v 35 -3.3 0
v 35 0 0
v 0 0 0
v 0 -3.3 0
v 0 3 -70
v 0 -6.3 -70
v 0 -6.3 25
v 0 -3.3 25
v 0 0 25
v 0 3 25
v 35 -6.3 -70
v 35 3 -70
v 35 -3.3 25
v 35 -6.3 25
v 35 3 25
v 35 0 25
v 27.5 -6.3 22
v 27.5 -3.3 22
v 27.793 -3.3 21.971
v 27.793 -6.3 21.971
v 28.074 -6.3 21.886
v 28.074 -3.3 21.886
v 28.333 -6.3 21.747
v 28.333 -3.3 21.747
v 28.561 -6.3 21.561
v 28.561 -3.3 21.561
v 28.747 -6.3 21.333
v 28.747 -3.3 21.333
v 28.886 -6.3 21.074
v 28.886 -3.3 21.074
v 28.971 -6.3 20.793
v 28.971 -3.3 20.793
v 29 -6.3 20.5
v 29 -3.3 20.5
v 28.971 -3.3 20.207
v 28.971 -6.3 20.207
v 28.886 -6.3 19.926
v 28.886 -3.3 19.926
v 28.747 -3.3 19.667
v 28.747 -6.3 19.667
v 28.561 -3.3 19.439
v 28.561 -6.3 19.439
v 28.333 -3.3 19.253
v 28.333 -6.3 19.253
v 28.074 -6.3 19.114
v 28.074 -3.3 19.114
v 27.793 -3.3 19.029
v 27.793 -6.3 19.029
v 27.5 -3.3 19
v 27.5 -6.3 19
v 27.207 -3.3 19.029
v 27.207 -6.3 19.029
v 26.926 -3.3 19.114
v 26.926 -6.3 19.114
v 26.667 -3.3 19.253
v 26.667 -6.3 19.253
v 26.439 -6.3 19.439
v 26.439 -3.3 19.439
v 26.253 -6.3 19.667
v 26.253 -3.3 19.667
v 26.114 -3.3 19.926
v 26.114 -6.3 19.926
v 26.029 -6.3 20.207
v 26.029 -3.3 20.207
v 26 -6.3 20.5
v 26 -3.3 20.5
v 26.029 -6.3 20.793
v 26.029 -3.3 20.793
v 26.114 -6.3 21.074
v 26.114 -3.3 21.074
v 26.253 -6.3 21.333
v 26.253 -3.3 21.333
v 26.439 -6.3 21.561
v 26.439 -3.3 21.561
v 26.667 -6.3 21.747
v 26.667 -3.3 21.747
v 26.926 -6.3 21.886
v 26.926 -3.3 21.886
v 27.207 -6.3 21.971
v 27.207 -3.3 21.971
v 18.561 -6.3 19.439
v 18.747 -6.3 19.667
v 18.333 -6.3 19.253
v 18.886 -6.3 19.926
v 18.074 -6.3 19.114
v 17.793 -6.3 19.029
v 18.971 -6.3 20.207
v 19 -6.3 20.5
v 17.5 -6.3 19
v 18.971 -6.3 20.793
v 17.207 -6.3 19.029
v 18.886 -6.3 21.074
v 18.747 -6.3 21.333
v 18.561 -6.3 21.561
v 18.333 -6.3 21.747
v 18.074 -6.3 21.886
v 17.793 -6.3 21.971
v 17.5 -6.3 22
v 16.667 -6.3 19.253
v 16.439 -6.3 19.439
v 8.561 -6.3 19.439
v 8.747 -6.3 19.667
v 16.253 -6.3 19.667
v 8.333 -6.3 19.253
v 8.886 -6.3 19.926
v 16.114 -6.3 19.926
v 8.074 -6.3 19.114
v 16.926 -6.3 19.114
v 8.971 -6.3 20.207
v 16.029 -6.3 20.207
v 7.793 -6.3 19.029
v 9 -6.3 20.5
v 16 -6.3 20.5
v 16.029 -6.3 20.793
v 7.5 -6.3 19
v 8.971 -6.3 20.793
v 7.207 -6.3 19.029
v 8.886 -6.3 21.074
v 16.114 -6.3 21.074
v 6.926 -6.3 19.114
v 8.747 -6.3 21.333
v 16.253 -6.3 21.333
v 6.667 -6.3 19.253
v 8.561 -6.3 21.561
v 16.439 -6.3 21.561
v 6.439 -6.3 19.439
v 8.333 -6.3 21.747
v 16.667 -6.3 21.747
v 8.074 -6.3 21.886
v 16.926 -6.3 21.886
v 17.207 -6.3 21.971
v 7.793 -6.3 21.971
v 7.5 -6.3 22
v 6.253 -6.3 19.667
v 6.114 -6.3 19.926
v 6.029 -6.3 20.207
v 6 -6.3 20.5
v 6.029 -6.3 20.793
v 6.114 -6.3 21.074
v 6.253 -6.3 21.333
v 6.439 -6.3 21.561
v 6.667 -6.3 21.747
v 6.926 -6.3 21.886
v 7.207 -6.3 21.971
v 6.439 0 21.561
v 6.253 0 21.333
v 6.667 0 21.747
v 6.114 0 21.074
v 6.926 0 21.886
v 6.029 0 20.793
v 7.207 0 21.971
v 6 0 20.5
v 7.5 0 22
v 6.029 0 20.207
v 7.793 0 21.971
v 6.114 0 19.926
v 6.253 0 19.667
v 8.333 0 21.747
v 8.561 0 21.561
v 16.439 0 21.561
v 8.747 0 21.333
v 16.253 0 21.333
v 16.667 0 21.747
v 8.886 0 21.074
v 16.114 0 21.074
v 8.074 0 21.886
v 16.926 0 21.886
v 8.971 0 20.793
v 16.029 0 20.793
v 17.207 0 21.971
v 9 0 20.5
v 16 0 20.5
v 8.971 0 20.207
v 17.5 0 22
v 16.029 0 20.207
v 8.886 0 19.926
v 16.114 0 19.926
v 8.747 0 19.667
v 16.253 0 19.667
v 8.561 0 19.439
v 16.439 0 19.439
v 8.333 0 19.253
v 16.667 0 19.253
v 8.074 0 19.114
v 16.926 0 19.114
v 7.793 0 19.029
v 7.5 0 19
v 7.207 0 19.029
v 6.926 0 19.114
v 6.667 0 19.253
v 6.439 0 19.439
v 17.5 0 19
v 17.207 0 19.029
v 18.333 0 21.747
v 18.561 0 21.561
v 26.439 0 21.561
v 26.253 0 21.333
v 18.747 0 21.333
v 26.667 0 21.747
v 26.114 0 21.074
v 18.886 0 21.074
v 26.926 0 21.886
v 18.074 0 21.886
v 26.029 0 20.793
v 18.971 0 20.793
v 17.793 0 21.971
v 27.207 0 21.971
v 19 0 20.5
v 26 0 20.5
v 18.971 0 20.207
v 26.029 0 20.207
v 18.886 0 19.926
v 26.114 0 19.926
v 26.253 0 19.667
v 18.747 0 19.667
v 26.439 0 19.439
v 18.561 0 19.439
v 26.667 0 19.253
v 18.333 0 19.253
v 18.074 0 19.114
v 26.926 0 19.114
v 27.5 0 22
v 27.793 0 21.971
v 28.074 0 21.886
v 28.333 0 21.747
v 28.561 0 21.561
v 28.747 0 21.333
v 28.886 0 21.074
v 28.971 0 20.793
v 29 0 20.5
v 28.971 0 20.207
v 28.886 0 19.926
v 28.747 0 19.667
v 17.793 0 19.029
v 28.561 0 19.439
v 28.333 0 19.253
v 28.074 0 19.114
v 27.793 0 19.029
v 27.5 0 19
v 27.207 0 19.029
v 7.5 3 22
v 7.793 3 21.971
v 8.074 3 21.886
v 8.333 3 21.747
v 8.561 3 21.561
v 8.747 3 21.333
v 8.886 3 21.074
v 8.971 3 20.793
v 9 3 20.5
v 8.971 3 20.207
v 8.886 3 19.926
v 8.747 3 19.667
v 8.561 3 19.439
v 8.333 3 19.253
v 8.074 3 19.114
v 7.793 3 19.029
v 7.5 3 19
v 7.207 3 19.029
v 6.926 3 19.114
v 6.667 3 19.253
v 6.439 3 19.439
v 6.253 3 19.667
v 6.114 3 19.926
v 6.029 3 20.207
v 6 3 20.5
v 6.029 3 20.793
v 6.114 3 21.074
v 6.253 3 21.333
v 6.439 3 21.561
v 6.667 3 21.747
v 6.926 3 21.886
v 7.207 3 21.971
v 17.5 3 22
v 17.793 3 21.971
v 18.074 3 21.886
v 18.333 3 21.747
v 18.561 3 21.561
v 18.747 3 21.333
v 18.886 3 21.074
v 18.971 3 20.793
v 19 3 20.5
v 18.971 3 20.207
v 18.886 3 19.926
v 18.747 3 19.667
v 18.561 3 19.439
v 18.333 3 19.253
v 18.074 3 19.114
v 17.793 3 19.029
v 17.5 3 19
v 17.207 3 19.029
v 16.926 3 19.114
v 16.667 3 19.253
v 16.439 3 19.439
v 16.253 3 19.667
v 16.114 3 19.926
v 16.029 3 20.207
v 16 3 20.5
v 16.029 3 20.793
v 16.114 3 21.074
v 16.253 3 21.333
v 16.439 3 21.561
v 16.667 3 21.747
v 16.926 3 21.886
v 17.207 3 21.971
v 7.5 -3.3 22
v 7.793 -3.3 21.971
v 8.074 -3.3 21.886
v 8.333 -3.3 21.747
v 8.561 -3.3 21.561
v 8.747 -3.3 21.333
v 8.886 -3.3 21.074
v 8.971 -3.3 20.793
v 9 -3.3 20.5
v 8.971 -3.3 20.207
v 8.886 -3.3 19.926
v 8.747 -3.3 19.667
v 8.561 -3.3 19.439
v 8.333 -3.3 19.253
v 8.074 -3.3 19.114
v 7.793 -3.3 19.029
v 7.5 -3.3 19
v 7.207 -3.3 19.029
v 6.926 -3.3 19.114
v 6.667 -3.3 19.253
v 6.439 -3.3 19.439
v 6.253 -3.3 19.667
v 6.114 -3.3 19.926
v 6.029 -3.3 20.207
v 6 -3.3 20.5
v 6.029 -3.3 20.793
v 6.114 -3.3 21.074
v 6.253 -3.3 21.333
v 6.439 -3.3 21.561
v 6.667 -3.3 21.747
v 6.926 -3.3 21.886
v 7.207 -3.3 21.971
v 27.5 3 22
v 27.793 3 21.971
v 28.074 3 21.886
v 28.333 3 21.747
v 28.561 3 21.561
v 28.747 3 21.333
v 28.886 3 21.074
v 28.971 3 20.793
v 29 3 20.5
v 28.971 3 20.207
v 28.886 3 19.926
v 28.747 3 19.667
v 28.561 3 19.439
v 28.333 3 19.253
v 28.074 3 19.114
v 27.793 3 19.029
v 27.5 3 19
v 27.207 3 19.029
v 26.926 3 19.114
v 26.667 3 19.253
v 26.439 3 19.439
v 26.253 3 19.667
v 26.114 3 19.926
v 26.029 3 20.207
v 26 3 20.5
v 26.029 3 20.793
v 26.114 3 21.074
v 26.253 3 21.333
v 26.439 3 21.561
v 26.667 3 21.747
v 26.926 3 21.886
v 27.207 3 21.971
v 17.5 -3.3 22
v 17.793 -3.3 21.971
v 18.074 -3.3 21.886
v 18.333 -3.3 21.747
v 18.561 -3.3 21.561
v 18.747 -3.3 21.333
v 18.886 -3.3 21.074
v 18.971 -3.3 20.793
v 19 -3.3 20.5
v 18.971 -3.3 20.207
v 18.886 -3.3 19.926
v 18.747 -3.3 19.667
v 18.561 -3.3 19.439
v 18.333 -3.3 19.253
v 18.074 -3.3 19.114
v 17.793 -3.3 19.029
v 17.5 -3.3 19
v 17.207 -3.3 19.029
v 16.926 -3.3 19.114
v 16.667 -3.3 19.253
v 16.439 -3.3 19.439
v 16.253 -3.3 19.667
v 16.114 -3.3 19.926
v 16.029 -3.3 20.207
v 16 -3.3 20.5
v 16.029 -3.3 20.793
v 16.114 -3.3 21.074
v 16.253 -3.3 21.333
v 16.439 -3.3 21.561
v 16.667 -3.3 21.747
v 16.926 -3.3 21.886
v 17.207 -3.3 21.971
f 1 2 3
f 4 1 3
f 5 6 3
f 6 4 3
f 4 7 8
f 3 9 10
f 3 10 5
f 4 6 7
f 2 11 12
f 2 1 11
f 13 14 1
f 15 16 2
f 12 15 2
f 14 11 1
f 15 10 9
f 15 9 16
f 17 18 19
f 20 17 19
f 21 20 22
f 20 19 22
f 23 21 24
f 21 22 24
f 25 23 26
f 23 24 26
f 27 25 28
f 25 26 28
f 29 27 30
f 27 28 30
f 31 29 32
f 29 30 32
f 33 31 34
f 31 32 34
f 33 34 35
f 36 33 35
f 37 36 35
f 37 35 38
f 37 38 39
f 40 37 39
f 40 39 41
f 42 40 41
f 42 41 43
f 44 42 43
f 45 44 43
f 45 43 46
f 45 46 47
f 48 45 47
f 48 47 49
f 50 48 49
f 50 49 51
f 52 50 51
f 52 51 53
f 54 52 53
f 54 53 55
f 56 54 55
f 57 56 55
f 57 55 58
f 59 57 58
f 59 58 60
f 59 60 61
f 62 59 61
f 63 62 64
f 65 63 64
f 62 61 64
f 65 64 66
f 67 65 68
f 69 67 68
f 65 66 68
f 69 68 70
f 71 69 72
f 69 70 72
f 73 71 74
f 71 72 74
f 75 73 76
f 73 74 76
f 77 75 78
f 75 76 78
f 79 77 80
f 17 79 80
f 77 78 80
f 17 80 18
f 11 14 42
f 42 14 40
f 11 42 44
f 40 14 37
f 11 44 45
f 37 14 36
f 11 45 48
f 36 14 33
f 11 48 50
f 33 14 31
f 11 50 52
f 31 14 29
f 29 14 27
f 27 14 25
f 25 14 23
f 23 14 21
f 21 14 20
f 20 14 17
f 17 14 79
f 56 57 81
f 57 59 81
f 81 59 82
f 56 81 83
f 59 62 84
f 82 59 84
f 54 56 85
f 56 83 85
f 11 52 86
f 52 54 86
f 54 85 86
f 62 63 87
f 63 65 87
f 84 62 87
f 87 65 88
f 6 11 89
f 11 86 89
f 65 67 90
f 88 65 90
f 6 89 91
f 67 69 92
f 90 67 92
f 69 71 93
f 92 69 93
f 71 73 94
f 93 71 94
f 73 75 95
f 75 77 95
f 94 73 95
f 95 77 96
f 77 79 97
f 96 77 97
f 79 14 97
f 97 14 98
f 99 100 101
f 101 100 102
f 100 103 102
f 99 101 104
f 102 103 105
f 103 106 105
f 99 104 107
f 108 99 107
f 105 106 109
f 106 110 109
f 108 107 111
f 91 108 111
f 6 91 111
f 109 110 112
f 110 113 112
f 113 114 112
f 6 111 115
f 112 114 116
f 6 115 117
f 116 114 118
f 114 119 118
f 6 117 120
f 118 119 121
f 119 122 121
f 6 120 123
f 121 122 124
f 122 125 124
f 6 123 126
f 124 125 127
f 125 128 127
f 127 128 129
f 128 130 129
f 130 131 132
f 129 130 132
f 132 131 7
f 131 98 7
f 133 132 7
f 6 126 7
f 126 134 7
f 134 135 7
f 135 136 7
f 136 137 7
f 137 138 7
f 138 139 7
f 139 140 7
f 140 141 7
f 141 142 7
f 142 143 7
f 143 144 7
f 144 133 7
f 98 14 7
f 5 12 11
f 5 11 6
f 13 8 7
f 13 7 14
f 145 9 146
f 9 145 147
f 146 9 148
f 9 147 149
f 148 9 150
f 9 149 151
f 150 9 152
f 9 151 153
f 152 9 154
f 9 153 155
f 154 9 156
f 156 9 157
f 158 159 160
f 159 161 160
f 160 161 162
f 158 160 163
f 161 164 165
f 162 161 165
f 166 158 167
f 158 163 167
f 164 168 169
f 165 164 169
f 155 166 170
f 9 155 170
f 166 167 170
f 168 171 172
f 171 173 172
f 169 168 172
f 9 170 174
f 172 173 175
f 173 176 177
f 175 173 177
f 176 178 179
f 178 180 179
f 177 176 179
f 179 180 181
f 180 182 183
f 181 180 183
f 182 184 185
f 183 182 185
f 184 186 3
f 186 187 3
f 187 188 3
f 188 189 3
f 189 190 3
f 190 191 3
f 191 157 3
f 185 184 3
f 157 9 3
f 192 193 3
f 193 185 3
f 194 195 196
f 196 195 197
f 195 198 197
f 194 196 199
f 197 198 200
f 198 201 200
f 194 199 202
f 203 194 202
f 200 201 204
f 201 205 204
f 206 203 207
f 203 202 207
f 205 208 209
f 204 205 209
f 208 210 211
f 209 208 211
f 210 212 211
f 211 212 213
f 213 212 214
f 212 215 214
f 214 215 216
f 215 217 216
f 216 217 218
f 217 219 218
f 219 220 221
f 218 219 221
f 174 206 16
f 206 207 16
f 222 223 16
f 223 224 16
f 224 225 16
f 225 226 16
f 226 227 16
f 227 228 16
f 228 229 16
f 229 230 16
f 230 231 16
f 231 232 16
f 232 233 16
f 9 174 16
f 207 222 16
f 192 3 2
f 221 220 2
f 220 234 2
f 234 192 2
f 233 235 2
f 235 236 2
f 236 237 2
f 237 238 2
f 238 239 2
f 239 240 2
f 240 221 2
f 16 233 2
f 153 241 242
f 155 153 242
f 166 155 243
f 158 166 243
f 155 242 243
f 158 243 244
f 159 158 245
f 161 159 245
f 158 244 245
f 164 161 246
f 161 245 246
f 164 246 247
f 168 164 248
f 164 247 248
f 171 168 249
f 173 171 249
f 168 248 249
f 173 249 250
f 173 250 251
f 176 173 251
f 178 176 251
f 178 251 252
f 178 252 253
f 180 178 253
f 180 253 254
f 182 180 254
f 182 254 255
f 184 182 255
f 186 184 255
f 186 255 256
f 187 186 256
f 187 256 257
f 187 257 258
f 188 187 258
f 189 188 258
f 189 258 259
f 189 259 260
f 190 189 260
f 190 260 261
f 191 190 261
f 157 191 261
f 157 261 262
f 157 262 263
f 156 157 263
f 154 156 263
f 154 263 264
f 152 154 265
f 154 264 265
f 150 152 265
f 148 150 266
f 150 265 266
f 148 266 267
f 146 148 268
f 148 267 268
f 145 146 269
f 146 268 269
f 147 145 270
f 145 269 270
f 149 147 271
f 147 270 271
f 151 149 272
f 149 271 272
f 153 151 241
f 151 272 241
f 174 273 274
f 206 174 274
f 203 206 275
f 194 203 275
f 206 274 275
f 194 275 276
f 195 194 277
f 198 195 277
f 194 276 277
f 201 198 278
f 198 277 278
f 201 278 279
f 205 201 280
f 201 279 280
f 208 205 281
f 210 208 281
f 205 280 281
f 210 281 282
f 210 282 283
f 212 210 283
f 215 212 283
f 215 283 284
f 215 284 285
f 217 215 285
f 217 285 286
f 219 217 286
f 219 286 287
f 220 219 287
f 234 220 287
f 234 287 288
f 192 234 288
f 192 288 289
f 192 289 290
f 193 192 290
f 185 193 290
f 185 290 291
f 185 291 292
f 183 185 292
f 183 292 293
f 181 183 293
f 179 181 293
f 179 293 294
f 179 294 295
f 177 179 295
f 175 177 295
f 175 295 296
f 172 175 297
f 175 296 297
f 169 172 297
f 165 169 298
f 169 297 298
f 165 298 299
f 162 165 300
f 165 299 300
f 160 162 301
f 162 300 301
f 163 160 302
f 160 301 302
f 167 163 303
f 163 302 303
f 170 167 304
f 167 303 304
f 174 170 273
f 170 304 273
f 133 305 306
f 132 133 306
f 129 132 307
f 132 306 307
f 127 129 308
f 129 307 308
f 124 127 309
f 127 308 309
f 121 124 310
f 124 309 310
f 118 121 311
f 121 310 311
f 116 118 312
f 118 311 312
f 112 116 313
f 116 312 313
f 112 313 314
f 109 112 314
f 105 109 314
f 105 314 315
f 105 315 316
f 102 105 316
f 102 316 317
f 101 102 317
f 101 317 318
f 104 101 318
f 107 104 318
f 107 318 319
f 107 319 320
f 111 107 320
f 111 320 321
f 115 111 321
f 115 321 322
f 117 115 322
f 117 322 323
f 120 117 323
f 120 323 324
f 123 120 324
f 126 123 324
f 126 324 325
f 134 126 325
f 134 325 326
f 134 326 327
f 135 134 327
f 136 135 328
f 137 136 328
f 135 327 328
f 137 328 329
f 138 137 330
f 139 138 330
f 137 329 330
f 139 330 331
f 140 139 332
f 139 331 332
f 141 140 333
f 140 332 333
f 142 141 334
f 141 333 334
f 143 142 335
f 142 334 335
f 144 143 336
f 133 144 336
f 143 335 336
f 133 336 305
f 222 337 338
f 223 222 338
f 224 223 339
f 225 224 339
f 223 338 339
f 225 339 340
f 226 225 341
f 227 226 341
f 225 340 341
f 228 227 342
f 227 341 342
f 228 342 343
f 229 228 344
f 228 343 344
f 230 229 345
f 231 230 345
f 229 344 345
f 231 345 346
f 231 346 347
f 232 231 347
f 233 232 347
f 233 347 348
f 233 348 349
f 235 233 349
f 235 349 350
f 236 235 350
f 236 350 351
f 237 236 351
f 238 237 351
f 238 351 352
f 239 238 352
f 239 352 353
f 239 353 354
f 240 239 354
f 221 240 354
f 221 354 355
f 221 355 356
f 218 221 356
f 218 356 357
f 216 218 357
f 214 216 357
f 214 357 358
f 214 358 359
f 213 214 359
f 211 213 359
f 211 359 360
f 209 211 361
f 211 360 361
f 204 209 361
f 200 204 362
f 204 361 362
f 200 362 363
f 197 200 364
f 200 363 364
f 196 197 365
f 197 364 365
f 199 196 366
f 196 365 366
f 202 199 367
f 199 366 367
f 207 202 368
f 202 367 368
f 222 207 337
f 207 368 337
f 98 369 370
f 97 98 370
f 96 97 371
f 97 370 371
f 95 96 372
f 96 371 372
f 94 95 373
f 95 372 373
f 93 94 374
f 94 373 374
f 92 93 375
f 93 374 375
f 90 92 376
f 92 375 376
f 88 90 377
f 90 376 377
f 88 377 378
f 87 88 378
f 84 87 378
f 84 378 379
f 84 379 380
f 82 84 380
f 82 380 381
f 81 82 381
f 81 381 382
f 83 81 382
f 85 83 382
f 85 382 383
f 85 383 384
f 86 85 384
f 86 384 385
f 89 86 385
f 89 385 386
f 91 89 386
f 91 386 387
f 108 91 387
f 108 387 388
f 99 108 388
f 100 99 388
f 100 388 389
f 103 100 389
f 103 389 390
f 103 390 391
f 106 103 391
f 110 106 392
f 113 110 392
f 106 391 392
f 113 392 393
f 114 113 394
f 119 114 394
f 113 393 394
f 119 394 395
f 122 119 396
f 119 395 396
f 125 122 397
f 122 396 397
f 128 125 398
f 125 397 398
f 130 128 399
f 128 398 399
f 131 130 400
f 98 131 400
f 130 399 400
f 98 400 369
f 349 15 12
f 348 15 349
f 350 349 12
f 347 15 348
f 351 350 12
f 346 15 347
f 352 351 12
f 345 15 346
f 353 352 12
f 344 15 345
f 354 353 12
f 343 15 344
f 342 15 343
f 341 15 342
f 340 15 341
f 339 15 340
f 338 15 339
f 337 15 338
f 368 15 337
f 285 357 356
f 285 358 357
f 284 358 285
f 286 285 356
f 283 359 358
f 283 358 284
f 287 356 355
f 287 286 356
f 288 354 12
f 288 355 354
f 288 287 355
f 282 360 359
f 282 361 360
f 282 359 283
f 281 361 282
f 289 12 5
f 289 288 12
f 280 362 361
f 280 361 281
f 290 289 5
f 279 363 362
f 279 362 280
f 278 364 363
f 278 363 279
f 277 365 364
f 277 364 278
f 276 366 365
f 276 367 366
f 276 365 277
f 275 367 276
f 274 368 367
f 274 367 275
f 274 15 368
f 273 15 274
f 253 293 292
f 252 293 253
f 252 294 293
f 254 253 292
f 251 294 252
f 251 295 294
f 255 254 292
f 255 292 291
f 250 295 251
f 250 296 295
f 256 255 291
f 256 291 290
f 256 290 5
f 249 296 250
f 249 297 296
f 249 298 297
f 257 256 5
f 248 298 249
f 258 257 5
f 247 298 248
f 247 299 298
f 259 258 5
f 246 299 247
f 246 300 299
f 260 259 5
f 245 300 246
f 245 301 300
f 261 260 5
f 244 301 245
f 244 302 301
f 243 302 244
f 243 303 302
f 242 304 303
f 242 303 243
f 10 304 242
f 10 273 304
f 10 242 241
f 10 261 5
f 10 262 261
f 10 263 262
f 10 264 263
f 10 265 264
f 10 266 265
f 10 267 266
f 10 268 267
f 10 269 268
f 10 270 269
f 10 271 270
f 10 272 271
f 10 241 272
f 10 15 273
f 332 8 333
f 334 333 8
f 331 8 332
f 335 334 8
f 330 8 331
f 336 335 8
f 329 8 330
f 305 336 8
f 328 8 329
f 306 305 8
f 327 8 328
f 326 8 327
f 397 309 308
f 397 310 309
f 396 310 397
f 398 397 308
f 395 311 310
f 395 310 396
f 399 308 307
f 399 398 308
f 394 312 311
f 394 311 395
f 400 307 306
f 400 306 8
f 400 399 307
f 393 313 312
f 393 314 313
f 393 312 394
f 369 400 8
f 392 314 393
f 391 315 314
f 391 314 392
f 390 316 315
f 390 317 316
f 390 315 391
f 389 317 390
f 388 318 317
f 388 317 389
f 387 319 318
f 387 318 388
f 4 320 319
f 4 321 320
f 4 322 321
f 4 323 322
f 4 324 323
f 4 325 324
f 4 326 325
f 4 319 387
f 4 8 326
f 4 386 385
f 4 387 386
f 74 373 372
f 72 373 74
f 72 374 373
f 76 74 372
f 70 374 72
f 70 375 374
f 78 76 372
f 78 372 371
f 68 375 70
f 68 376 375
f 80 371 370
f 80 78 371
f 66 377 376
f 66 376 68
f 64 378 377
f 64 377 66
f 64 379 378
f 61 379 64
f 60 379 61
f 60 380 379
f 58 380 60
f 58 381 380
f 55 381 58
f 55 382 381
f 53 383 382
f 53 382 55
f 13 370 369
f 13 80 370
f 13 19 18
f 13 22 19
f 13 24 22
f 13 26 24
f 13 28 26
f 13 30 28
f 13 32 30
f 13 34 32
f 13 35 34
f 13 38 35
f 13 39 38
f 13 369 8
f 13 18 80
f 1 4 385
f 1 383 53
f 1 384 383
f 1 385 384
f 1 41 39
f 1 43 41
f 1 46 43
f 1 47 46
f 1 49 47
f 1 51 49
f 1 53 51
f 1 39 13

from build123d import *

# Parameters (mm, degrees)
SKETCH_1_W          = 35
SKETCH_1_H          = 3
EXTRUDE_1_DEPTH     = 25
EXTRUDE_1_2_DEPTH   = 25
SKETCH_2_W          = 35
SKETCH_2_H          = 9.3
EXTRUDE_2_DEPTH     = 70
SKETCH_3_R          = 1.5
CUT_EXTRUDE_1_DEPTH = 10


with BuildPart() as part:
    # 草图1 → 凸台-拉伸1 (new body)
    with BuildSketch(Plane.XY):
        with Locations((17.5, 1.5)):
            Rectangle(SKETCH_1_W, SKETCH_1_H)
    extrude(amount=EXTRUDE_1_DEPTH)



with BuildPart() as body_2:
    # 草图1 → Extrude 1 2 (new body)
    with BuildSketch(Plane.XY):
        with Locations((17.5, -4.8)):
            Rectangle(SKETCH_1_W, SKETCH_1_H)
    extrude(amount=EXTRUDE_1_2_DEPTH)


with BuildPart() as part_1:
    add(part.part)

    add(body_2.part)  # 凸台-拉伸2 merges body 2
    # 草图2 → 凸台-拉伸2 (add)
    with BuildSketch(Plane(origin=(0, 0, 0), x_dir=(-1, 0, 0), z_dir=(0, 0, -1))):
        with Locations((-17.5, -1.65)):
            Rectangle(SKETCH_2_W, SKETCH_2_H)
    extrude(amount=EXTRUDE_2_DEPTH)

    # 草图3 → 切除-拉伸1 (cut)
    with BuildSketch(Plane(origin=(0, 3, 0), x_dir=(1, 0, 0), z_dir=(0, 1, 0))):
        with Locations(Location((7.5, -20.5, 0), (0, 0, 270))):
            Circle(SKETCH_3_R)
        with Locations(Location((17.5, -20.5, 0), (0, 0, 270))):
            Circle(SKETCH_3_R)
        with Locations(Location((27.5, -20.5, 0), (0, 0, 270))):
            Circle(SKETCH_3_R)
    extrude(amount=-CUT_EXTRUDE_1_DEPTH, mode=Mode.SUBTRACT)


solid = part_1.part
